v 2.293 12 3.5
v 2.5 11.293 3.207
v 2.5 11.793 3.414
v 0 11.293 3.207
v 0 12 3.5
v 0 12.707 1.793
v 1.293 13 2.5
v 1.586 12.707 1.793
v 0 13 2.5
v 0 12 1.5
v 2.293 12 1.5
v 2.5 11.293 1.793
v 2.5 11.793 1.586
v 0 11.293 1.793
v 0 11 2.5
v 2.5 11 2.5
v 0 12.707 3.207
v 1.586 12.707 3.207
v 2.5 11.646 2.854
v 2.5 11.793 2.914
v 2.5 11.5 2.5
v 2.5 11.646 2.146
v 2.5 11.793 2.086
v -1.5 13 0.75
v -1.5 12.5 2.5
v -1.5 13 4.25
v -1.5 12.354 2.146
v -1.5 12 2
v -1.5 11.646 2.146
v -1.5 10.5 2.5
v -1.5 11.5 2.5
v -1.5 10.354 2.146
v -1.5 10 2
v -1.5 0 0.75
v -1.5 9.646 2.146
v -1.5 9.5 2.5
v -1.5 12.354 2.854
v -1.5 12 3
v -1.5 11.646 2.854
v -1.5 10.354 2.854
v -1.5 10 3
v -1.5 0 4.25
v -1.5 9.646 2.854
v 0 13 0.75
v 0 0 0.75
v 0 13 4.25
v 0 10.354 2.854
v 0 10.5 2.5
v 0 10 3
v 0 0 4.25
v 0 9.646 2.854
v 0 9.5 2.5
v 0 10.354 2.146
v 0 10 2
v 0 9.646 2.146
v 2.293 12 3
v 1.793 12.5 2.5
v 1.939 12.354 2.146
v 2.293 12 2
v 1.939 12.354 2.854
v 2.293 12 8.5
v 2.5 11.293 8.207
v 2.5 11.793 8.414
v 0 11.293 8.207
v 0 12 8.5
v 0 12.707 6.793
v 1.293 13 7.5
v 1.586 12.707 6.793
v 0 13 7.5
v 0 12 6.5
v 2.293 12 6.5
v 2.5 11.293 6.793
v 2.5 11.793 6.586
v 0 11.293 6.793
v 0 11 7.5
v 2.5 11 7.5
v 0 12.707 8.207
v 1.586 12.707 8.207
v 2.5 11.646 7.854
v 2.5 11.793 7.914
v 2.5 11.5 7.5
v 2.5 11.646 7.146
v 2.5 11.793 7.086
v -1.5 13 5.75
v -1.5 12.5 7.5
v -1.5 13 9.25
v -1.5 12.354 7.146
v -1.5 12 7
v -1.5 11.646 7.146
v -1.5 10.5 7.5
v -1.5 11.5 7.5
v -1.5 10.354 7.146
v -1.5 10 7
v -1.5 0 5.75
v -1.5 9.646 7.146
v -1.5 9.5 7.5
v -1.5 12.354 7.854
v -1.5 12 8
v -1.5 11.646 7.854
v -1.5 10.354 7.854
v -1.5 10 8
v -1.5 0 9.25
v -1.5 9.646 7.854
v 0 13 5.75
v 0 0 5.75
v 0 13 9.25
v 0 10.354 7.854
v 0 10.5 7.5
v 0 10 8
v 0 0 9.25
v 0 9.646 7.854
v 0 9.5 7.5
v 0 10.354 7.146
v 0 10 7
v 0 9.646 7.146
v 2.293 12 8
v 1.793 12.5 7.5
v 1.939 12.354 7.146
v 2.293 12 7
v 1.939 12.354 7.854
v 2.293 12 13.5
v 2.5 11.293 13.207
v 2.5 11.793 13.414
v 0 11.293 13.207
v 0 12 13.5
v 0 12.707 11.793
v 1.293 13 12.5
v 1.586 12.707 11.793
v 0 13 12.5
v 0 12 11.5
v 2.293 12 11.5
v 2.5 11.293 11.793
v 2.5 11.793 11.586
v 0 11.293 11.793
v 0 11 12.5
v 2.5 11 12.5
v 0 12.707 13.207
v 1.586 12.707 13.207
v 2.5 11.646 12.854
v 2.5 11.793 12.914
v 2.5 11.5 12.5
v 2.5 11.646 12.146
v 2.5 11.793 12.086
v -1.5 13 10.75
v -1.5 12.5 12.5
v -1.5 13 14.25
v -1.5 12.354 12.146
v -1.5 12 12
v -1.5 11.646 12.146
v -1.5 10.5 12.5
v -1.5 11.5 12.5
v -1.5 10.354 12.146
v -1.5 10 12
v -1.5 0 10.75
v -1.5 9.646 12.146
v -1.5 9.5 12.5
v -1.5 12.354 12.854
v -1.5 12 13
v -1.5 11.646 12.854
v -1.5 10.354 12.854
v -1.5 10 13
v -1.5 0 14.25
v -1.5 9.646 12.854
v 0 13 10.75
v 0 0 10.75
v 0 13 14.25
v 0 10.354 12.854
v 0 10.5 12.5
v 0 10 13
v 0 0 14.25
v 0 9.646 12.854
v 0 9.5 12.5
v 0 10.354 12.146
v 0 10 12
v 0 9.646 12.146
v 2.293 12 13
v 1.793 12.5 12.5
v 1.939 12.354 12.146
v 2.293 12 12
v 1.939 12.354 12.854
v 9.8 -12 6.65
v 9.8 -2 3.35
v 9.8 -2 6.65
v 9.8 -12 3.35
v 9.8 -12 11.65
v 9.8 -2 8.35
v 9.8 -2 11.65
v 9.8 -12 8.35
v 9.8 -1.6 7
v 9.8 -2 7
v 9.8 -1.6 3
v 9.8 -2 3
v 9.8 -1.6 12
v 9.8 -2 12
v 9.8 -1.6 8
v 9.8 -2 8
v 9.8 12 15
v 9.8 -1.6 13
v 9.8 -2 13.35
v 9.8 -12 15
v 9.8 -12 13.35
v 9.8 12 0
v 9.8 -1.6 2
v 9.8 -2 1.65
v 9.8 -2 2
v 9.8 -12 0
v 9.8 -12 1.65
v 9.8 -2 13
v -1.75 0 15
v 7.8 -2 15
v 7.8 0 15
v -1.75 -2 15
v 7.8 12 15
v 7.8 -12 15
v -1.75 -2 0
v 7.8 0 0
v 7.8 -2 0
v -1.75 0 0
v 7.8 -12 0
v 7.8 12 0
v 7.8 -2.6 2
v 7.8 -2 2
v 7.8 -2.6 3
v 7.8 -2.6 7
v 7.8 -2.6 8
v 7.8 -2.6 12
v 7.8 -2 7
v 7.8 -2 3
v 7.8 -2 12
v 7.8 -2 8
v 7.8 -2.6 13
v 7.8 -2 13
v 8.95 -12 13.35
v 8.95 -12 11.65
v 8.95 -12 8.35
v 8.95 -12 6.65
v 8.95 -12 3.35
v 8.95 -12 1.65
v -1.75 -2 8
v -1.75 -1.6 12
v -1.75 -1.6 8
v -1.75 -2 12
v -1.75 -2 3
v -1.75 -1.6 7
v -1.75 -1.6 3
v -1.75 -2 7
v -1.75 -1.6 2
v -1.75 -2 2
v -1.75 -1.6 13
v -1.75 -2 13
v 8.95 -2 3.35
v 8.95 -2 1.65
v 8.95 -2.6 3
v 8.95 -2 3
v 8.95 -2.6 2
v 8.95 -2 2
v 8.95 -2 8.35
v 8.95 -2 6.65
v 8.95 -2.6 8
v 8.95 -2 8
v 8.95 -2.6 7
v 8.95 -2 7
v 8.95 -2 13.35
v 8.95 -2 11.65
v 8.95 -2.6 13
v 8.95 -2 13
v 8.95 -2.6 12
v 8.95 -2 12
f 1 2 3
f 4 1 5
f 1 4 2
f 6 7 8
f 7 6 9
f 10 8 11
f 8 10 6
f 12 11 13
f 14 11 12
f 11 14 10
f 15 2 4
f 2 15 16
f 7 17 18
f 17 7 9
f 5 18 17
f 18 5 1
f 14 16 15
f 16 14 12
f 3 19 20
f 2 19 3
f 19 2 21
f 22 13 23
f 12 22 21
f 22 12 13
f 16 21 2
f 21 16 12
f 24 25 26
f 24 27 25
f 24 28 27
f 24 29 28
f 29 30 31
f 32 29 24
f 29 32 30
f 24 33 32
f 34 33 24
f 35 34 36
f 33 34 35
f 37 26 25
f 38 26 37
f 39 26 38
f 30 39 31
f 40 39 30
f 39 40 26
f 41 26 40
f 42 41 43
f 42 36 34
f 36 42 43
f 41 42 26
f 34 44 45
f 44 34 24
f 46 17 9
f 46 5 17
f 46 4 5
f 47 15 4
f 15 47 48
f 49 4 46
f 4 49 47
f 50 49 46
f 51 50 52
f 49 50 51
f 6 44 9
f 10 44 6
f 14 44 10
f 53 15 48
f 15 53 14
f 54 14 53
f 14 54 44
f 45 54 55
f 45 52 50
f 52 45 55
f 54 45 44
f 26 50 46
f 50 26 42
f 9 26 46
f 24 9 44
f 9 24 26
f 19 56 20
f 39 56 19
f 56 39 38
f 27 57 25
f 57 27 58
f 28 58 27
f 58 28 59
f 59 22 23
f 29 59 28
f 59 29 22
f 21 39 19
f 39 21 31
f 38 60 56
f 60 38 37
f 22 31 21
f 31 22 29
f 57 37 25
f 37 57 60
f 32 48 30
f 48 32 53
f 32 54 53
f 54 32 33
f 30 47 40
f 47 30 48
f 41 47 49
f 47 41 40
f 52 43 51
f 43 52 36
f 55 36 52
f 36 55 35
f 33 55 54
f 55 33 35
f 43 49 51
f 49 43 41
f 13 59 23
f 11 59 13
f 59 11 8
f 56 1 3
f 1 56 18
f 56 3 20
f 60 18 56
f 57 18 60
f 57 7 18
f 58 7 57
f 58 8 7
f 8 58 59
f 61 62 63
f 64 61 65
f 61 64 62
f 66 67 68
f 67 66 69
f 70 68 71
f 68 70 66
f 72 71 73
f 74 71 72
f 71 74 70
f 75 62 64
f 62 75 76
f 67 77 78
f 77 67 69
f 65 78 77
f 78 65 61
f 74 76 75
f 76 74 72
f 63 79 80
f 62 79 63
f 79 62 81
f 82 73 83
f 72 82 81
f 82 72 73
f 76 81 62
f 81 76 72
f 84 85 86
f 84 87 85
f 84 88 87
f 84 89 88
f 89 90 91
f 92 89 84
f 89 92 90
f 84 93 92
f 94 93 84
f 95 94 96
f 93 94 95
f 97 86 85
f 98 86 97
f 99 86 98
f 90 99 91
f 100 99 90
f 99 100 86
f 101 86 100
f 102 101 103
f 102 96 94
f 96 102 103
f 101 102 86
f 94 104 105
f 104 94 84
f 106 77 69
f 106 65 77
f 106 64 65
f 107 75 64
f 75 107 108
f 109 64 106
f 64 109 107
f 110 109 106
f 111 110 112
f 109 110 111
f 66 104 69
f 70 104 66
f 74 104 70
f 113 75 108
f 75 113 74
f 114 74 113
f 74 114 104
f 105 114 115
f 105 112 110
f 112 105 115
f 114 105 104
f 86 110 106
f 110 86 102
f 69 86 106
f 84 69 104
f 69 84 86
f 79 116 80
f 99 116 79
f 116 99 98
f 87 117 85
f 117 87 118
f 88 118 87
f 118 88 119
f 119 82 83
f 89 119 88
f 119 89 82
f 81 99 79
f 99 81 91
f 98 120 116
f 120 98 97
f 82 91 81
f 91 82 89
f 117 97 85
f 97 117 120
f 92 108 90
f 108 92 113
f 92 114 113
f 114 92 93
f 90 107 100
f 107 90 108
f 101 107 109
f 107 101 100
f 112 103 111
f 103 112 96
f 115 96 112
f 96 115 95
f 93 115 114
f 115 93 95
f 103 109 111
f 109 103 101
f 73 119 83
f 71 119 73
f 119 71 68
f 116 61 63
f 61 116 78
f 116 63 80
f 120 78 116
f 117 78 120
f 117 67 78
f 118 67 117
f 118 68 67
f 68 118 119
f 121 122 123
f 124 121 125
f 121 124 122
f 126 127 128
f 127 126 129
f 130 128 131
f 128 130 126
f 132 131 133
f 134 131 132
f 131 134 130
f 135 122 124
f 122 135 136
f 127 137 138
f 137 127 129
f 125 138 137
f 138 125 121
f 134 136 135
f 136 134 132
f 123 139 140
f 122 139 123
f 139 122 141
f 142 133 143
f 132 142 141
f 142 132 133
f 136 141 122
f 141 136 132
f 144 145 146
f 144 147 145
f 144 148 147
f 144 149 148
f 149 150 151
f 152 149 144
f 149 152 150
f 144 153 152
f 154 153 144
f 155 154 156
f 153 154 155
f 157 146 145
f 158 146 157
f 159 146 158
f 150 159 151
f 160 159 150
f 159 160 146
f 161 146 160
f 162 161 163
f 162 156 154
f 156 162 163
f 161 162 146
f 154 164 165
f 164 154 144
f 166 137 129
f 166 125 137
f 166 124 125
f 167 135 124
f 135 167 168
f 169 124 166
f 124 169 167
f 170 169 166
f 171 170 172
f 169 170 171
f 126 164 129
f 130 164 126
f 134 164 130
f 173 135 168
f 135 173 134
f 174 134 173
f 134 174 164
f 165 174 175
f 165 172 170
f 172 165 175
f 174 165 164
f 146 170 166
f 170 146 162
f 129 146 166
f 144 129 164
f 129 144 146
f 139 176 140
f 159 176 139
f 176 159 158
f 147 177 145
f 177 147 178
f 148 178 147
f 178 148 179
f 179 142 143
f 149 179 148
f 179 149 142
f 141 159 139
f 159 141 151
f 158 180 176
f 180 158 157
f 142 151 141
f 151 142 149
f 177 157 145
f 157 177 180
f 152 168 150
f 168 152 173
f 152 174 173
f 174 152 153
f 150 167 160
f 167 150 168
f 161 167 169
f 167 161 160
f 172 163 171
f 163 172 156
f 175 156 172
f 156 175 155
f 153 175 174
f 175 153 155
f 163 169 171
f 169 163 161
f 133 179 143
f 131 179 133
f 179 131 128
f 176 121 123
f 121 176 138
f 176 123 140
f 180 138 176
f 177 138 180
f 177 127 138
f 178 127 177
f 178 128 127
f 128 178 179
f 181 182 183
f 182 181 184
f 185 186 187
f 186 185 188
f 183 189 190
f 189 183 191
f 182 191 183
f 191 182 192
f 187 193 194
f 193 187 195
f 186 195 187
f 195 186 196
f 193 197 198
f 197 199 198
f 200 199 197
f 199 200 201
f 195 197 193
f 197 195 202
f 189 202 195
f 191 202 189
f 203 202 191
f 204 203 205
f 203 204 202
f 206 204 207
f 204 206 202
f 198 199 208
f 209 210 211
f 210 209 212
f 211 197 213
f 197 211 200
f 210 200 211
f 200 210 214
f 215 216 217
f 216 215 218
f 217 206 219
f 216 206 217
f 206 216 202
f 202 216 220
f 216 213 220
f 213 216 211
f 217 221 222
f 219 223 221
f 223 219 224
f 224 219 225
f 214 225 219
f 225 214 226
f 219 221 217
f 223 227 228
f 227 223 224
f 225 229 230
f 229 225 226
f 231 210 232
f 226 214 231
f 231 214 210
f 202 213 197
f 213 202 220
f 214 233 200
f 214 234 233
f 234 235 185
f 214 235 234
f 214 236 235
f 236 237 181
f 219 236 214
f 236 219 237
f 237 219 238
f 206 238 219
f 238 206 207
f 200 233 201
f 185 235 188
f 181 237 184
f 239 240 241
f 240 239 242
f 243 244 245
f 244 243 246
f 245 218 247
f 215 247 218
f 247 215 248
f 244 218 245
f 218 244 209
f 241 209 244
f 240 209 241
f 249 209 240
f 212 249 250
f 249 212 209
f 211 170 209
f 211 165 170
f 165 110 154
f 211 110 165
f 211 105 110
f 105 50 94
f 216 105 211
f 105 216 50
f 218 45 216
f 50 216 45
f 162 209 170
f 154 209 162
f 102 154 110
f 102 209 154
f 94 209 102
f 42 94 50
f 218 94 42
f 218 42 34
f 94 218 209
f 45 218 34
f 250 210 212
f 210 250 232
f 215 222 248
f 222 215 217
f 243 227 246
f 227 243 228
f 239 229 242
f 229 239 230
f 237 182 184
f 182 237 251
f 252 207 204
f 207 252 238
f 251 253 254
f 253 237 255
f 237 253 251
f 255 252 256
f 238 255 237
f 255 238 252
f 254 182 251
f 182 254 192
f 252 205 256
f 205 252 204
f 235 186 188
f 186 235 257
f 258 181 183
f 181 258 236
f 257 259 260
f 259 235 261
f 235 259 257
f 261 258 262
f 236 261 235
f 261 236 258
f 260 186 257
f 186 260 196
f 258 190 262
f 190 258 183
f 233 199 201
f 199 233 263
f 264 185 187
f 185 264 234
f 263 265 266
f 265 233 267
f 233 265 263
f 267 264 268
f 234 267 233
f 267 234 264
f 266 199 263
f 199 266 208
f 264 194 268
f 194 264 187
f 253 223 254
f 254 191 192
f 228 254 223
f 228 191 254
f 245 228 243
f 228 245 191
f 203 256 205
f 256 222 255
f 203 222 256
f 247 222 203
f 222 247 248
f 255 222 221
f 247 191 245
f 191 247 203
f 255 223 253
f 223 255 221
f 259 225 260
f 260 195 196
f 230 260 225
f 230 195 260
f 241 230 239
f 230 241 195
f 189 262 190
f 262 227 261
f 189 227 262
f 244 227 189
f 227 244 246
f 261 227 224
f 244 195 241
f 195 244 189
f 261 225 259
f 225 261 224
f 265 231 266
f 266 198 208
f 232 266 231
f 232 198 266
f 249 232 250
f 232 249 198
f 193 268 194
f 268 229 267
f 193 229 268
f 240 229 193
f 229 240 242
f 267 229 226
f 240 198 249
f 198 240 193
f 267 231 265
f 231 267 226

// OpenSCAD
$fn=8;




ts=2; // толщина стенки
tp=1;//диаметр жилы
tpr=1.7;//диаметр провода
trb=[2,tp,2.5];//внешний, внутренний высота
knt=[12,7.8, 7.5];//высота до центра, толщина, высота стопора
lin=[3.5,knt.x+trb.x,1.5];//ширина, длина, толщина

step=5;
kk=3;

//translate([0, 0,lin.z+knt.y/2]) cube([ts,step,knt.y],true);

//all();
module all(){
    difference(){
        union(){
            translate([-step/2+step*kk/2, trb.x/2-lin.y/2,ts+knt.y]) cube([step*kk,lin.y,ts],true);
            translate([-step/2+step*kk/2, -ts/2-knt.x,(2*ts+knt.y)/2]) cube([step*kk,ts,ts+knt.y],true);
            //translate([-step/2+step*kk/2, -ts/2-knt.z,ts+knt.y-knt.y/6]) cube([step*kk,ts,ts+knt.y/3],true);
            translate([-step/2+step*kk/2, -lin.y/2-knt.x,ts/2]) cube([step*kk,lin.y,ts],true);
            for(a=[0:1:kk-1]){
                translate([a*step, 0,0])pin();
            }
        }
        for(a=[0:1:kk-1]){
            translate([a*step, -(knt.x+3*ts/2),0])cylinder(trb.z*2,trb.y/2,trb.y/2);
        }
    }
}


all_2();
module all_2(){
    difference(){
        union(){
            for(a=[0:1:kk-1]){
                translate([0,0,a*step])pin2();
            }
            hh=step*kk;
            translate([knt.y+ts/2, 0, hh/2]) cube([ts,knt.x*2,hh],true);
            translate([knt.y/2, -ts/2, hh/2]) cube([knt.y+ts+lin.z,ts,hh],true);
        }
        for(a=[0:1:kk-1]){
            translate([0,0,a*step])pin3();
        }
        for(a=[0:1:kk-1]){
            translate([0,0,a*step])pin4();
        }
    }
}




module pin4(){
    translate([knt.x/2,-ts-0.1,step/2])cube([knt.x*2,tp,tp],true);;
}

module pin3(){
    translate([knt.y+ts,-knt.x/2-ts,step/2])cube([tpr,knt.x,tpr],true);;
}


module pin2(){
    translate([-lin.z,knt.x,step/2])rotate([0,90,0])pin();
}

module pin1(){
    translate([0,0,lin.z])rotate([0,180,0])pin();
}
//pin();
module pin(){
    difference(){
        union(){
            cylinder(trb.z+lin.z,trb.x/2,trb.x/2);
            translate([0, trb.x/2-lin.y/2,lin.z/2]) cube(lin,true);
        }
        translate([0,0,-0.1])cylinder(trb.z*2,trb.y/2,trb.y/2);
        translate([0,-(trb.x/2+trb.y),-0.1])cylinder(trb.z*2,trb.y/2,trb.y/2);
        translate([0, 0,trb.z+lin.z+trb.x/4]) rotate([-45,0,0])cube([trb.x*2,trb.x*2,trb.x/2],true);
    }
}
module pin_s(){
    difference(){
        union(){
            cylinder(trb.z+lin.z-trb.x/2,trb.x/2,trb.x/2);
            translate([0, 0,trb.z+lin.z-trb.x/2])sphere(r=trb.x/2);
            translate([0, trb.x/2-lin.y/2,lin.z/2]) cube(lin,true);
        }
        translate([0,0,-0.1])cylinder(trb.z*2,trb.y/2,trb.y/2);
        translate([0,-(trb.x/2+trb.y),-0.1])cylinder(trb.z*2,trb.y/2,trb.y/2);
    }
}
